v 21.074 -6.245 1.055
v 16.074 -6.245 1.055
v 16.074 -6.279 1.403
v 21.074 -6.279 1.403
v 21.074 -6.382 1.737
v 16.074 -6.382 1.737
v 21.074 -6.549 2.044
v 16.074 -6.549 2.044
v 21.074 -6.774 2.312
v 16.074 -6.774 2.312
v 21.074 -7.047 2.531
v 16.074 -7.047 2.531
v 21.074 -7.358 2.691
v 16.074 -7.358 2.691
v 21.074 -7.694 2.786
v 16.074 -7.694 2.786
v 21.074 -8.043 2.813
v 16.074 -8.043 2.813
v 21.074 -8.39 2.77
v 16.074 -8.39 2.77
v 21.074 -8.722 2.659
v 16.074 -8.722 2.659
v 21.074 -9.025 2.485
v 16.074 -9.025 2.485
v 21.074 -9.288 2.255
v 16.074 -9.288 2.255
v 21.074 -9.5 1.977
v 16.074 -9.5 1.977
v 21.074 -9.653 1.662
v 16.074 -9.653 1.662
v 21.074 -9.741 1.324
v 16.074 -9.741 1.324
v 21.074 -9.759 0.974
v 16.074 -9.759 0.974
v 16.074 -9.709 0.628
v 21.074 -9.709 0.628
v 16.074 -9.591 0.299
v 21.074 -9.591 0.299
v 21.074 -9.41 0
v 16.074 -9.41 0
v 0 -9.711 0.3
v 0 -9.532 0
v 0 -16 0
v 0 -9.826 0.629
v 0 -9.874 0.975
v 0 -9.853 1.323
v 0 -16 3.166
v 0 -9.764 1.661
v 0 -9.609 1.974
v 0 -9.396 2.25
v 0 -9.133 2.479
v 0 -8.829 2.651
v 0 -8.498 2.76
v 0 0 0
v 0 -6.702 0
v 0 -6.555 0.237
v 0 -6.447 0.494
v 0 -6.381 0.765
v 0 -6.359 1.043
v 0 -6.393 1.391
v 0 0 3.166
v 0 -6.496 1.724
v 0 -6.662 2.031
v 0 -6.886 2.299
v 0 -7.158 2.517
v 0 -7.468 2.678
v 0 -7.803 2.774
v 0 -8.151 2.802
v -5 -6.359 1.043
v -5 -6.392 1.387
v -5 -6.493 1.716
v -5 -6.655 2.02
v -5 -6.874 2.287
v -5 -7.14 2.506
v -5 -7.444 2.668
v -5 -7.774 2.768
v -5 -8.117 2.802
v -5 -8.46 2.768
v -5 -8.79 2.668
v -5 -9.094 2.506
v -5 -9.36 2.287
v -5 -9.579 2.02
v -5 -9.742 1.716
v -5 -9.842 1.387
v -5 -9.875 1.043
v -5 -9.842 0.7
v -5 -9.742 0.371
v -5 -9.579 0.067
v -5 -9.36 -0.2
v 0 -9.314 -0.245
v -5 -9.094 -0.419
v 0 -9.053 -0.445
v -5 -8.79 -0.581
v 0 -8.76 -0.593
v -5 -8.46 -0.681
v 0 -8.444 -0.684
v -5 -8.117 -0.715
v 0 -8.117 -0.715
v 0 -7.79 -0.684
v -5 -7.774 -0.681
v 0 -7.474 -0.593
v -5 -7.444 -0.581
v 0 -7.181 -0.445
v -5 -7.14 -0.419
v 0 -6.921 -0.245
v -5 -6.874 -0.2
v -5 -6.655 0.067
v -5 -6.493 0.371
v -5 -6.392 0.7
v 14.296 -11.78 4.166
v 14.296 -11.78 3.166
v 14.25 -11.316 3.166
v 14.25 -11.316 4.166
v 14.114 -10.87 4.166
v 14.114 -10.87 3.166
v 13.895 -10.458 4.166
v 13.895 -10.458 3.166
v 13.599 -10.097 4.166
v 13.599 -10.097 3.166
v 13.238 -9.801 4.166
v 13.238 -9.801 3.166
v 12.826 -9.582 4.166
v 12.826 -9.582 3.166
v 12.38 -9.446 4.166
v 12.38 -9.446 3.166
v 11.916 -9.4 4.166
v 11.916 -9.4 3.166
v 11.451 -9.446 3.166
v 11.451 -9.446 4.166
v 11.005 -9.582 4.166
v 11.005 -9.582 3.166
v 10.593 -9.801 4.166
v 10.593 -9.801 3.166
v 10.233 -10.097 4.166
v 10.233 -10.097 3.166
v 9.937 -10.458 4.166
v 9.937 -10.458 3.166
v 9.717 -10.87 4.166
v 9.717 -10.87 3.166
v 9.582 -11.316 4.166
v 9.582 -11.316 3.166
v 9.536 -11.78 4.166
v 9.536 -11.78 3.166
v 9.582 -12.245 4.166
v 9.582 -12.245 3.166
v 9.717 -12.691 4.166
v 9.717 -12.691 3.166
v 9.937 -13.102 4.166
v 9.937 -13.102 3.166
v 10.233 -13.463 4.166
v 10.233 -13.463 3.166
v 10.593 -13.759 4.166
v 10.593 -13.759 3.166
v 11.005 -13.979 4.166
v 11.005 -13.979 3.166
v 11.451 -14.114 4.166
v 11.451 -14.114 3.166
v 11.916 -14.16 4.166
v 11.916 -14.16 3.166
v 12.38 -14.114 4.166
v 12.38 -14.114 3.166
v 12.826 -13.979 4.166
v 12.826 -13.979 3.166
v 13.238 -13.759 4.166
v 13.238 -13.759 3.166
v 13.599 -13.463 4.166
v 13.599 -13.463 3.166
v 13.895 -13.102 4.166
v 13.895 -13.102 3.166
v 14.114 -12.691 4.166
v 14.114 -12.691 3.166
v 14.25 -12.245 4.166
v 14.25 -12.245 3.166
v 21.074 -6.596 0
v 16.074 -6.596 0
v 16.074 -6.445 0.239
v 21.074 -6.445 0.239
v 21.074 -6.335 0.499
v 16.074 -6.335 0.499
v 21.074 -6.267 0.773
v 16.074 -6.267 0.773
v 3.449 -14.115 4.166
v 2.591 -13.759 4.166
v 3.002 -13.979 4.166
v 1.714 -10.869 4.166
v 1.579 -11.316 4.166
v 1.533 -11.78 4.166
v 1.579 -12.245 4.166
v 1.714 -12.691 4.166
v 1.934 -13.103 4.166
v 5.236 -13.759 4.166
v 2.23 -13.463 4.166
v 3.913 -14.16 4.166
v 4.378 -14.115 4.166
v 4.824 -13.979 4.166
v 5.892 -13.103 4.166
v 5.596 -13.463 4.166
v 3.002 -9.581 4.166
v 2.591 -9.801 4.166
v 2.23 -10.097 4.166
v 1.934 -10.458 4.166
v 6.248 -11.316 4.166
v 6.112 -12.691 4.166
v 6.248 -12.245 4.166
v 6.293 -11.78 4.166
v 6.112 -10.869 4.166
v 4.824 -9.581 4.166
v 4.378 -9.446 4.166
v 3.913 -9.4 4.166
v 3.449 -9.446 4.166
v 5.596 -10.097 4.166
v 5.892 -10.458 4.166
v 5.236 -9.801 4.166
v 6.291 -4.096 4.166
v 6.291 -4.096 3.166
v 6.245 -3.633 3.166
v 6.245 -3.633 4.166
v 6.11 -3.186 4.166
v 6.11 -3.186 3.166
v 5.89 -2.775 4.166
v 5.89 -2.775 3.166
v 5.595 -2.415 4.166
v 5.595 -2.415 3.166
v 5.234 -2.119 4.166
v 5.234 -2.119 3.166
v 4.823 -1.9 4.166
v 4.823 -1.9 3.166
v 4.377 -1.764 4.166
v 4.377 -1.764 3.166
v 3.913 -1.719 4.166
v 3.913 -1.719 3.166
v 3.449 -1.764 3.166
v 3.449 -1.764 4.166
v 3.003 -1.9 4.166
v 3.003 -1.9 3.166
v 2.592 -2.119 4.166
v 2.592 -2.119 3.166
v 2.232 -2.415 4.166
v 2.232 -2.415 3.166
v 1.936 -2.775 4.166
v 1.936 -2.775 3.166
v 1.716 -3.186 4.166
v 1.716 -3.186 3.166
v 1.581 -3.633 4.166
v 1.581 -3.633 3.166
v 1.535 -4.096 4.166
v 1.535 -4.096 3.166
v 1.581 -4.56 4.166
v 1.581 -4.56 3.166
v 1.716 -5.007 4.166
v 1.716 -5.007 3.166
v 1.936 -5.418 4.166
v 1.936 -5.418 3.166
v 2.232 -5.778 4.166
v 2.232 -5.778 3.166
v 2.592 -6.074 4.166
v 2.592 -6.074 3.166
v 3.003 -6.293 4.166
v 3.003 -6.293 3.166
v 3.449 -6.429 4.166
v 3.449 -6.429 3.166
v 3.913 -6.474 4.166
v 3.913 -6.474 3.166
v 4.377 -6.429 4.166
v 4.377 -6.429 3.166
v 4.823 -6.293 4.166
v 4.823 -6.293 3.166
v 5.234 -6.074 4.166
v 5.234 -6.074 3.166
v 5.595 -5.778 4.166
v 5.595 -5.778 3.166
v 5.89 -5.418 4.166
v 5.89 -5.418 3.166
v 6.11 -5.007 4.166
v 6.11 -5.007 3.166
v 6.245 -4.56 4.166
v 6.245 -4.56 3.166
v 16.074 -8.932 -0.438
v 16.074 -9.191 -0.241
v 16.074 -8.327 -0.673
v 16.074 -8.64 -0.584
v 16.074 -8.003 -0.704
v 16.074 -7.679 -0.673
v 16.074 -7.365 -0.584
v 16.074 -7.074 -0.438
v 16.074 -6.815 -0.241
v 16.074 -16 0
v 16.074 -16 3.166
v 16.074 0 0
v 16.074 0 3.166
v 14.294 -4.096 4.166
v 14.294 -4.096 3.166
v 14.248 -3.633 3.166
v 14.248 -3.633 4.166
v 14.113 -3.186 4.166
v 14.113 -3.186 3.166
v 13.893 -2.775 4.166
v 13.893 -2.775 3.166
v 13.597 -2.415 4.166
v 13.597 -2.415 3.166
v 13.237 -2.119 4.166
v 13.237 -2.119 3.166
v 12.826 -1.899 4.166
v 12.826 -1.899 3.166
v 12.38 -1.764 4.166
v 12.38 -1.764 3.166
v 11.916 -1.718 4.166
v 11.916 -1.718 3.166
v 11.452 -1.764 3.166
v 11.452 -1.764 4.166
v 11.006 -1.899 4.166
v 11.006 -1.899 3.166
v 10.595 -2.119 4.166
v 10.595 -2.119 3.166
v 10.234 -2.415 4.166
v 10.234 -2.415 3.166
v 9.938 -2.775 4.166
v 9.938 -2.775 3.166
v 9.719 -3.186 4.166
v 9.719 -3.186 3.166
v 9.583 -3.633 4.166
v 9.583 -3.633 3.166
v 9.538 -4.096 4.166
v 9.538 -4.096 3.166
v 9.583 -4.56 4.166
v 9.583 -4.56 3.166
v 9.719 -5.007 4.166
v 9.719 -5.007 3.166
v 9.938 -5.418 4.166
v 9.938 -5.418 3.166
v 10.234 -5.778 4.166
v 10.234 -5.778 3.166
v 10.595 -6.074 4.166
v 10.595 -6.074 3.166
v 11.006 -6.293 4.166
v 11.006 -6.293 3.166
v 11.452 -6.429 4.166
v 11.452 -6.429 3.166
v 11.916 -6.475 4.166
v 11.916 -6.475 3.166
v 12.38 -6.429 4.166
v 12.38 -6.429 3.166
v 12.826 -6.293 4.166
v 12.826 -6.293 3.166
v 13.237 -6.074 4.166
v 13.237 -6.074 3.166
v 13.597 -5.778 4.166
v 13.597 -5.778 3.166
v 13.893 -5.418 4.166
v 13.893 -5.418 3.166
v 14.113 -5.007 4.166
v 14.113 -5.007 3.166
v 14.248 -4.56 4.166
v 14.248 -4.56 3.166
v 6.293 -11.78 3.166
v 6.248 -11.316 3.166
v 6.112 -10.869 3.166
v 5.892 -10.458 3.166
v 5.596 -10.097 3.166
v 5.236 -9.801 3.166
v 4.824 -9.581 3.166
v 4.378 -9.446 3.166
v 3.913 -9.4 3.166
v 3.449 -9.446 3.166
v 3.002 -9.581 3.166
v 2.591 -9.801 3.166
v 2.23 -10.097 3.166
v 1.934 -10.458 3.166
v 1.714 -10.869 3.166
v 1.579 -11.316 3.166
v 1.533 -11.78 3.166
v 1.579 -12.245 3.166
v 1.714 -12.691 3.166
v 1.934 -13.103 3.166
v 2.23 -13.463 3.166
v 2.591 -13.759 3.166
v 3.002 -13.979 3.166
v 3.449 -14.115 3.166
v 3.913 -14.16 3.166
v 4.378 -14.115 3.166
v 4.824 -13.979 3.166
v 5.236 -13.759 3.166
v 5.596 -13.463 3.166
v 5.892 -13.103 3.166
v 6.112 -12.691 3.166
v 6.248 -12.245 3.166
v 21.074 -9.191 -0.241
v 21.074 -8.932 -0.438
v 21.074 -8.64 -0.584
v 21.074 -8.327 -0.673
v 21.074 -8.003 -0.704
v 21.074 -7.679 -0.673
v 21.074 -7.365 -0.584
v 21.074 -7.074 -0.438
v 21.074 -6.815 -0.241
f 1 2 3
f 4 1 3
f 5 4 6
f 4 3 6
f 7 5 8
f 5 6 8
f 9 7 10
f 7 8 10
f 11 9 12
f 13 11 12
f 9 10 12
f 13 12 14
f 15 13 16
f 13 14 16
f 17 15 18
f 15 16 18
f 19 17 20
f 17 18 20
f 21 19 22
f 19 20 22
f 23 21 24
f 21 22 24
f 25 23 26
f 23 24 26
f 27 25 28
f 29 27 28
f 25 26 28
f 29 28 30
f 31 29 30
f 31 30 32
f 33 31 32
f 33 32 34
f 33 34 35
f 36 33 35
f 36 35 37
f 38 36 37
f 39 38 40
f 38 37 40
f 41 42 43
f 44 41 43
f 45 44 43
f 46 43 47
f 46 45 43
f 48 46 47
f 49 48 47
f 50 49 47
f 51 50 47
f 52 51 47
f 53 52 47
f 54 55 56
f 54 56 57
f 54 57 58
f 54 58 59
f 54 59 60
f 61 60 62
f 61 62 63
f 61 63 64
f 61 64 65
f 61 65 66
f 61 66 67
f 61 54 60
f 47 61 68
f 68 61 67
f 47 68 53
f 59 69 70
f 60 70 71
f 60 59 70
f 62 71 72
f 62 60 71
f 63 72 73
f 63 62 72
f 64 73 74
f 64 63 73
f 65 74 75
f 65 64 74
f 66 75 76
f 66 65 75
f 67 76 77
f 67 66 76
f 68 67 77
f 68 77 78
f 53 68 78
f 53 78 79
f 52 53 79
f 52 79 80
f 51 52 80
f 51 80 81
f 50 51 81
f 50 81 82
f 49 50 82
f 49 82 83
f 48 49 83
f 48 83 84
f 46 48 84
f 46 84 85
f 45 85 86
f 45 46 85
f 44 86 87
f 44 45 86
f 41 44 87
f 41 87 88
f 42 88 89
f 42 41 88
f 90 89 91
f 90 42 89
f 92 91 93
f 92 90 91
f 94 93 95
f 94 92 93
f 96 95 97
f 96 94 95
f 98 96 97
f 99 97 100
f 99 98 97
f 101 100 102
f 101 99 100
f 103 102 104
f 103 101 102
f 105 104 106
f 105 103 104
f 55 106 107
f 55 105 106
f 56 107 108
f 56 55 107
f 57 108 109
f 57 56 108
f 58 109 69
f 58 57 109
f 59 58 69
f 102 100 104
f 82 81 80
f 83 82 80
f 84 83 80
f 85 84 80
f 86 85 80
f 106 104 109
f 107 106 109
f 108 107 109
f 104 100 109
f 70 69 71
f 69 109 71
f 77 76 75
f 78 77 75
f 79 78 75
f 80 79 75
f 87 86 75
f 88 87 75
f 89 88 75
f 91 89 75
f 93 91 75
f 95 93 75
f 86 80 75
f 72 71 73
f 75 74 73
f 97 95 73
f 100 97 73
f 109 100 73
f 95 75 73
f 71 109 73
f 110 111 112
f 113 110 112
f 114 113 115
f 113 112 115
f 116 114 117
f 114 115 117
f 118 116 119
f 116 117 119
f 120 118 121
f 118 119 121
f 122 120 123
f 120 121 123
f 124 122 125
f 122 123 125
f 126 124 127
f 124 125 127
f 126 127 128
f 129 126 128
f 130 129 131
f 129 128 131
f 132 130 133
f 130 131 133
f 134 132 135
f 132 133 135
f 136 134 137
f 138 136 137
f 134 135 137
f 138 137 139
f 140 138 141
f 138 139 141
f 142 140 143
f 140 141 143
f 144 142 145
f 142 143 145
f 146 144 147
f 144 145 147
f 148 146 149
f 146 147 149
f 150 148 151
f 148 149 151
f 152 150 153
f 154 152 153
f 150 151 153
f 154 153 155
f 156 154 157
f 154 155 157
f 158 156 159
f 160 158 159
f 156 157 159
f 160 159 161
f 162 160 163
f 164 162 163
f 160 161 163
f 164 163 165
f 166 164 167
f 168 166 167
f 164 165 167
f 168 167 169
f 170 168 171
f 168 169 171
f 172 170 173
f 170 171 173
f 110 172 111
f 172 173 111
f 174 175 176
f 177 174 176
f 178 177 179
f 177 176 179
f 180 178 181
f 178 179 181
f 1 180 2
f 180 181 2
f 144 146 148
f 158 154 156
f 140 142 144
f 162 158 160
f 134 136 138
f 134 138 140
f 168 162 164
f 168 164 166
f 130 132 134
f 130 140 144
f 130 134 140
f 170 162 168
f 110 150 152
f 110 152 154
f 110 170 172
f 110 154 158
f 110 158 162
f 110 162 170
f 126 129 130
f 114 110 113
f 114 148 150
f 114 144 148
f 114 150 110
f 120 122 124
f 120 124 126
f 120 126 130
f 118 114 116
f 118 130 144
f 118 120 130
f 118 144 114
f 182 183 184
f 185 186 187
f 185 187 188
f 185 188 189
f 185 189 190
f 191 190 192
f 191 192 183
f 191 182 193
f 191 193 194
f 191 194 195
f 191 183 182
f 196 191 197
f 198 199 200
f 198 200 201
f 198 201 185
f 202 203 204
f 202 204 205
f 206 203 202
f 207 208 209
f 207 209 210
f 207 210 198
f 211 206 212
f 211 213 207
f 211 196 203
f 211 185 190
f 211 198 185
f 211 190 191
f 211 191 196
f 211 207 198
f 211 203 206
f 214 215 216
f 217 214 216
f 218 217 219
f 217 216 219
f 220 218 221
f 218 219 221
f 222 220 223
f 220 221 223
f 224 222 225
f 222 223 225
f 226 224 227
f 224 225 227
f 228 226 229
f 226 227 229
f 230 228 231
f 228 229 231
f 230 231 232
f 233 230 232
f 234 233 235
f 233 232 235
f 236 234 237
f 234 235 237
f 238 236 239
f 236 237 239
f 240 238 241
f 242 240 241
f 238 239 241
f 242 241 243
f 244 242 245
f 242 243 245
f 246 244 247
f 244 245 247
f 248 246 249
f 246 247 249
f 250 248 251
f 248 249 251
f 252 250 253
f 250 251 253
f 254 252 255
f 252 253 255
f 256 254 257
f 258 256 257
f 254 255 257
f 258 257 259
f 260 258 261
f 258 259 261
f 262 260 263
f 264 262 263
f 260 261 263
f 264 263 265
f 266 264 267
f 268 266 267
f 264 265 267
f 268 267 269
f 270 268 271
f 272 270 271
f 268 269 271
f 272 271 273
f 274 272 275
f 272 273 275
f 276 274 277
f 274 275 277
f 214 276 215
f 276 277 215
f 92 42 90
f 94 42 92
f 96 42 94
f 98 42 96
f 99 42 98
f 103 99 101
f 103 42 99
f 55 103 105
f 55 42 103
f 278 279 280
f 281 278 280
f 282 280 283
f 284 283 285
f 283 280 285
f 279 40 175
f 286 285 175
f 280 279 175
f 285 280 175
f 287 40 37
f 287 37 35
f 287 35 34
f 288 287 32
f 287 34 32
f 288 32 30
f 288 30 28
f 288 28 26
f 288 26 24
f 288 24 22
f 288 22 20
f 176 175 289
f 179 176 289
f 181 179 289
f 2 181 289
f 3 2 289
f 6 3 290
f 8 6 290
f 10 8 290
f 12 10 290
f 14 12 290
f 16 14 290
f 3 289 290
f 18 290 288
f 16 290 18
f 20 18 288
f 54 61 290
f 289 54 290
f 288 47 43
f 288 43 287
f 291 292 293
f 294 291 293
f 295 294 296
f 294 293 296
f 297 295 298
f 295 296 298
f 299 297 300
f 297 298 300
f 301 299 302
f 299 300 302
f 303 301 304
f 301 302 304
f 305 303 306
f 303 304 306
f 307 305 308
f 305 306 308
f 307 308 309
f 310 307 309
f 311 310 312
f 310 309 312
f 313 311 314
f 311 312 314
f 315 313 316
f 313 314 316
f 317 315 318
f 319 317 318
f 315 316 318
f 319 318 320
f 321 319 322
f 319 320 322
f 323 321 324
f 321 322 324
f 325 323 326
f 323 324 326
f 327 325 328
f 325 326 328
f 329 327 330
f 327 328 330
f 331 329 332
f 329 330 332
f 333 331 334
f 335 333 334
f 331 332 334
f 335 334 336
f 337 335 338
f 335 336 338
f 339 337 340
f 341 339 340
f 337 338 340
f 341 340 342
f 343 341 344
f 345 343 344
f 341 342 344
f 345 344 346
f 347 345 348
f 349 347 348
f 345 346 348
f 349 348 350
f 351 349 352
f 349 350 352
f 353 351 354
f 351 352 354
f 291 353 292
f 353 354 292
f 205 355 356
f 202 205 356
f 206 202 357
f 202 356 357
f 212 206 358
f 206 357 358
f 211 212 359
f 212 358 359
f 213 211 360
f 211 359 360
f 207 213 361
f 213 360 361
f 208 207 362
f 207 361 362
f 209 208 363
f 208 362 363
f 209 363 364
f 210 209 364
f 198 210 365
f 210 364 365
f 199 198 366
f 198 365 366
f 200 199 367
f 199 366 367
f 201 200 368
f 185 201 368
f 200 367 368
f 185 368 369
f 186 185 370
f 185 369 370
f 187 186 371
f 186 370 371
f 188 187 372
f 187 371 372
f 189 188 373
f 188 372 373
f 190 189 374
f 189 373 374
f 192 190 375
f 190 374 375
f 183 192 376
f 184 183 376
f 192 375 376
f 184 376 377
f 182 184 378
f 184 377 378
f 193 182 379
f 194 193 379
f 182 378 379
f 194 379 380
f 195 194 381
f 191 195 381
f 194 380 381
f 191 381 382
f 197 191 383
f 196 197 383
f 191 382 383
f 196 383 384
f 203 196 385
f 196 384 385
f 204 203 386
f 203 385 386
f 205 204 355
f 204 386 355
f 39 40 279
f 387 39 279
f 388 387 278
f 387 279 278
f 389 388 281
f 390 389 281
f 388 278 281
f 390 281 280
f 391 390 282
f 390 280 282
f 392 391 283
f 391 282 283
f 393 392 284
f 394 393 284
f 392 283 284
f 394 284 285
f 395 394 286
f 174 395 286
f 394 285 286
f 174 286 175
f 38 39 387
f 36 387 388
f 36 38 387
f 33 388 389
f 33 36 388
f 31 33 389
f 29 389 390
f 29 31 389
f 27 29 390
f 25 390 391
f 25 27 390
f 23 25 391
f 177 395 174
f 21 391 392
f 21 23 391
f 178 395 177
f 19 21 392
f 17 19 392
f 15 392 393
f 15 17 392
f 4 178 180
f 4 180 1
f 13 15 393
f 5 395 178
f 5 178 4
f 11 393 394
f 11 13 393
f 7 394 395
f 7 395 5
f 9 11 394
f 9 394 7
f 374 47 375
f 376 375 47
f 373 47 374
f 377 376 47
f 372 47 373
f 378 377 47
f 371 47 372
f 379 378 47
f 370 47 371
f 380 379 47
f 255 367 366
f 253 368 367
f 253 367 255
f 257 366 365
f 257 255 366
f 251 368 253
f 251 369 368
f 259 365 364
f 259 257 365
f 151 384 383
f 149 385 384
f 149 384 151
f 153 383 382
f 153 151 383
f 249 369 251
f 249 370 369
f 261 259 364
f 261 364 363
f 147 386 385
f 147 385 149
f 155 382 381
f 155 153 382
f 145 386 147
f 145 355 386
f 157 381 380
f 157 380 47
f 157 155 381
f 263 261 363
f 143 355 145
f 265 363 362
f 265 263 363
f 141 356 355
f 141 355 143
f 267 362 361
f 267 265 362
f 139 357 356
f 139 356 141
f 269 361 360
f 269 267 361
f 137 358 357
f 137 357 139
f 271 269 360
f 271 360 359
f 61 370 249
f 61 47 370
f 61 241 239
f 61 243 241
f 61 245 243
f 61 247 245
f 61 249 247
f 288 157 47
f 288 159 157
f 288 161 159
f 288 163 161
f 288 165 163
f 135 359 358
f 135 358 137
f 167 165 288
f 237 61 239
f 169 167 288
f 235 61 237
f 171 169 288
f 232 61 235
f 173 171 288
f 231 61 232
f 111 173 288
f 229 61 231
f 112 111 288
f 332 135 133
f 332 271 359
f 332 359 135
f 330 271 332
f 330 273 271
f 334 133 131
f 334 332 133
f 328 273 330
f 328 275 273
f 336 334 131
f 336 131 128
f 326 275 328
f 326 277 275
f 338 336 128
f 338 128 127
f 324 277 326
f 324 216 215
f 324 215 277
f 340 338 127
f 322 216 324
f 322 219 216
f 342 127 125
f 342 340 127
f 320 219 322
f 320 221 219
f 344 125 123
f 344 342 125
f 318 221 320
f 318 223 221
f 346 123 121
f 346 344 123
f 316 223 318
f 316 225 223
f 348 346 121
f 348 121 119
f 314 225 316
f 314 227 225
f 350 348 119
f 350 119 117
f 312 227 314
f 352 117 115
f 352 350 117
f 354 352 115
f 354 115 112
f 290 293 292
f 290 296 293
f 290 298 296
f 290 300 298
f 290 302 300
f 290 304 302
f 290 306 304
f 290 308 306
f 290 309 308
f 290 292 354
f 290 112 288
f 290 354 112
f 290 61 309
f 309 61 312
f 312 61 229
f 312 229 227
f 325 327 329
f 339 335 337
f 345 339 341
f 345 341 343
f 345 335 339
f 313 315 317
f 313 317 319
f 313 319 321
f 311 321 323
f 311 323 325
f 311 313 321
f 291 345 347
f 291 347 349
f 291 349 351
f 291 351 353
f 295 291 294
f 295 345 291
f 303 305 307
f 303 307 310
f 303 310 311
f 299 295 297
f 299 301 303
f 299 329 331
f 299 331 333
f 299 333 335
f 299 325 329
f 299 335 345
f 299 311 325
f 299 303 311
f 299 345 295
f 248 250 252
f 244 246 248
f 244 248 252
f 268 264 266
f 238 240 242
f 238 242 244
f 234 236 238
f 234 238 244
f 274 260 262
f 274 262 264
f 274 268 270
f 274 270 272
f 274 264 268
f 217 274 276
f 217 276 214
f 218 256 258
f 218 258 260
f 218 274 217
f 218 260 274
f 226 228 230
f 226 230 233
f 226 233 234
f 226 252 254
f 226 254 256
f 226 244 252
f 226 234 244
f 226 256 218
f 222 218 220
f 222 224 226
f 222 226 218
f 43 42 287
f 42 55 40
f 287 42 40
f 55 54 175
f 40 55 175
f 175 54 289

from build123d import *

# Parameters (mm, degrees)
F0_W     = 16.0737466067
F0_H     = 3.1658632215
F1_DEPTH = 16
F2_R     = 2.3801305446
F2_R_2   = 2.3799092656
F2_R_3   = 2.3780181716
F2_R_4   = 2.3779678295
F3_DEPTH = 1
F5_DEPTH = 5
F6_R     = 1.7583787775
F7_DEPTH = 5


with BuildPart() as f1:
    # F0 (on Front) → F1 (new body)
    with BuildSketch(Plane.XZ):
        with Locations((8.0368733034, 1.5829316108)):
            Rectangle(F0_W, F0_H)
    extrude(amount=F1_DEPTH)

    # F2 (on face) → F3 (join)
    with BuildSketch(Plane.XY.offset(3.1658632215)):
        with Locations((3.9132172242, -11.7802852765)):
            Circle(F2_R)
        with Locations((11.9156921282, -11.7802852765)):
            Circle(F2_R_2)
        with Locations((11.9156921282, -4.0964945219)):
            Circle(F2_R_3)
        with Locations((3.9132172242, -4.0964945219)):
            Circle(F2_R_4)
    extrude(amount=F3_DEPTH)

    # F4 (on face) → F5 (join)
    with BuildSketch(Plane.YZ.offset(16.0737466067)):
        with BuildLine():
            ThreePointArc((-6.5959664397, 0), (-6.3346840784, 0.4988617172), (-6.2445068398, 1.0547389975))
            ThreePointArc((-6.2445068398, 1.0547389975), (-8.5587628976, 2.7229405364), (-9.409804795, 0))
            ThreePointArc((-9.409804795, 0), (-8.0028856173, -0.70363978), (-6.5959664397, 0))
        make_face()
    extrude(amount=F5_DEPTH)

    # F6 (on Right) → F7 (join)
    with BuildSketch(Plane.YZ):
        with Locations((-8.1170331687, 1.0434978176)):
            Circle(F6_R)
    extrude(amount=-F7_DEPTH)


solid = f1.part
